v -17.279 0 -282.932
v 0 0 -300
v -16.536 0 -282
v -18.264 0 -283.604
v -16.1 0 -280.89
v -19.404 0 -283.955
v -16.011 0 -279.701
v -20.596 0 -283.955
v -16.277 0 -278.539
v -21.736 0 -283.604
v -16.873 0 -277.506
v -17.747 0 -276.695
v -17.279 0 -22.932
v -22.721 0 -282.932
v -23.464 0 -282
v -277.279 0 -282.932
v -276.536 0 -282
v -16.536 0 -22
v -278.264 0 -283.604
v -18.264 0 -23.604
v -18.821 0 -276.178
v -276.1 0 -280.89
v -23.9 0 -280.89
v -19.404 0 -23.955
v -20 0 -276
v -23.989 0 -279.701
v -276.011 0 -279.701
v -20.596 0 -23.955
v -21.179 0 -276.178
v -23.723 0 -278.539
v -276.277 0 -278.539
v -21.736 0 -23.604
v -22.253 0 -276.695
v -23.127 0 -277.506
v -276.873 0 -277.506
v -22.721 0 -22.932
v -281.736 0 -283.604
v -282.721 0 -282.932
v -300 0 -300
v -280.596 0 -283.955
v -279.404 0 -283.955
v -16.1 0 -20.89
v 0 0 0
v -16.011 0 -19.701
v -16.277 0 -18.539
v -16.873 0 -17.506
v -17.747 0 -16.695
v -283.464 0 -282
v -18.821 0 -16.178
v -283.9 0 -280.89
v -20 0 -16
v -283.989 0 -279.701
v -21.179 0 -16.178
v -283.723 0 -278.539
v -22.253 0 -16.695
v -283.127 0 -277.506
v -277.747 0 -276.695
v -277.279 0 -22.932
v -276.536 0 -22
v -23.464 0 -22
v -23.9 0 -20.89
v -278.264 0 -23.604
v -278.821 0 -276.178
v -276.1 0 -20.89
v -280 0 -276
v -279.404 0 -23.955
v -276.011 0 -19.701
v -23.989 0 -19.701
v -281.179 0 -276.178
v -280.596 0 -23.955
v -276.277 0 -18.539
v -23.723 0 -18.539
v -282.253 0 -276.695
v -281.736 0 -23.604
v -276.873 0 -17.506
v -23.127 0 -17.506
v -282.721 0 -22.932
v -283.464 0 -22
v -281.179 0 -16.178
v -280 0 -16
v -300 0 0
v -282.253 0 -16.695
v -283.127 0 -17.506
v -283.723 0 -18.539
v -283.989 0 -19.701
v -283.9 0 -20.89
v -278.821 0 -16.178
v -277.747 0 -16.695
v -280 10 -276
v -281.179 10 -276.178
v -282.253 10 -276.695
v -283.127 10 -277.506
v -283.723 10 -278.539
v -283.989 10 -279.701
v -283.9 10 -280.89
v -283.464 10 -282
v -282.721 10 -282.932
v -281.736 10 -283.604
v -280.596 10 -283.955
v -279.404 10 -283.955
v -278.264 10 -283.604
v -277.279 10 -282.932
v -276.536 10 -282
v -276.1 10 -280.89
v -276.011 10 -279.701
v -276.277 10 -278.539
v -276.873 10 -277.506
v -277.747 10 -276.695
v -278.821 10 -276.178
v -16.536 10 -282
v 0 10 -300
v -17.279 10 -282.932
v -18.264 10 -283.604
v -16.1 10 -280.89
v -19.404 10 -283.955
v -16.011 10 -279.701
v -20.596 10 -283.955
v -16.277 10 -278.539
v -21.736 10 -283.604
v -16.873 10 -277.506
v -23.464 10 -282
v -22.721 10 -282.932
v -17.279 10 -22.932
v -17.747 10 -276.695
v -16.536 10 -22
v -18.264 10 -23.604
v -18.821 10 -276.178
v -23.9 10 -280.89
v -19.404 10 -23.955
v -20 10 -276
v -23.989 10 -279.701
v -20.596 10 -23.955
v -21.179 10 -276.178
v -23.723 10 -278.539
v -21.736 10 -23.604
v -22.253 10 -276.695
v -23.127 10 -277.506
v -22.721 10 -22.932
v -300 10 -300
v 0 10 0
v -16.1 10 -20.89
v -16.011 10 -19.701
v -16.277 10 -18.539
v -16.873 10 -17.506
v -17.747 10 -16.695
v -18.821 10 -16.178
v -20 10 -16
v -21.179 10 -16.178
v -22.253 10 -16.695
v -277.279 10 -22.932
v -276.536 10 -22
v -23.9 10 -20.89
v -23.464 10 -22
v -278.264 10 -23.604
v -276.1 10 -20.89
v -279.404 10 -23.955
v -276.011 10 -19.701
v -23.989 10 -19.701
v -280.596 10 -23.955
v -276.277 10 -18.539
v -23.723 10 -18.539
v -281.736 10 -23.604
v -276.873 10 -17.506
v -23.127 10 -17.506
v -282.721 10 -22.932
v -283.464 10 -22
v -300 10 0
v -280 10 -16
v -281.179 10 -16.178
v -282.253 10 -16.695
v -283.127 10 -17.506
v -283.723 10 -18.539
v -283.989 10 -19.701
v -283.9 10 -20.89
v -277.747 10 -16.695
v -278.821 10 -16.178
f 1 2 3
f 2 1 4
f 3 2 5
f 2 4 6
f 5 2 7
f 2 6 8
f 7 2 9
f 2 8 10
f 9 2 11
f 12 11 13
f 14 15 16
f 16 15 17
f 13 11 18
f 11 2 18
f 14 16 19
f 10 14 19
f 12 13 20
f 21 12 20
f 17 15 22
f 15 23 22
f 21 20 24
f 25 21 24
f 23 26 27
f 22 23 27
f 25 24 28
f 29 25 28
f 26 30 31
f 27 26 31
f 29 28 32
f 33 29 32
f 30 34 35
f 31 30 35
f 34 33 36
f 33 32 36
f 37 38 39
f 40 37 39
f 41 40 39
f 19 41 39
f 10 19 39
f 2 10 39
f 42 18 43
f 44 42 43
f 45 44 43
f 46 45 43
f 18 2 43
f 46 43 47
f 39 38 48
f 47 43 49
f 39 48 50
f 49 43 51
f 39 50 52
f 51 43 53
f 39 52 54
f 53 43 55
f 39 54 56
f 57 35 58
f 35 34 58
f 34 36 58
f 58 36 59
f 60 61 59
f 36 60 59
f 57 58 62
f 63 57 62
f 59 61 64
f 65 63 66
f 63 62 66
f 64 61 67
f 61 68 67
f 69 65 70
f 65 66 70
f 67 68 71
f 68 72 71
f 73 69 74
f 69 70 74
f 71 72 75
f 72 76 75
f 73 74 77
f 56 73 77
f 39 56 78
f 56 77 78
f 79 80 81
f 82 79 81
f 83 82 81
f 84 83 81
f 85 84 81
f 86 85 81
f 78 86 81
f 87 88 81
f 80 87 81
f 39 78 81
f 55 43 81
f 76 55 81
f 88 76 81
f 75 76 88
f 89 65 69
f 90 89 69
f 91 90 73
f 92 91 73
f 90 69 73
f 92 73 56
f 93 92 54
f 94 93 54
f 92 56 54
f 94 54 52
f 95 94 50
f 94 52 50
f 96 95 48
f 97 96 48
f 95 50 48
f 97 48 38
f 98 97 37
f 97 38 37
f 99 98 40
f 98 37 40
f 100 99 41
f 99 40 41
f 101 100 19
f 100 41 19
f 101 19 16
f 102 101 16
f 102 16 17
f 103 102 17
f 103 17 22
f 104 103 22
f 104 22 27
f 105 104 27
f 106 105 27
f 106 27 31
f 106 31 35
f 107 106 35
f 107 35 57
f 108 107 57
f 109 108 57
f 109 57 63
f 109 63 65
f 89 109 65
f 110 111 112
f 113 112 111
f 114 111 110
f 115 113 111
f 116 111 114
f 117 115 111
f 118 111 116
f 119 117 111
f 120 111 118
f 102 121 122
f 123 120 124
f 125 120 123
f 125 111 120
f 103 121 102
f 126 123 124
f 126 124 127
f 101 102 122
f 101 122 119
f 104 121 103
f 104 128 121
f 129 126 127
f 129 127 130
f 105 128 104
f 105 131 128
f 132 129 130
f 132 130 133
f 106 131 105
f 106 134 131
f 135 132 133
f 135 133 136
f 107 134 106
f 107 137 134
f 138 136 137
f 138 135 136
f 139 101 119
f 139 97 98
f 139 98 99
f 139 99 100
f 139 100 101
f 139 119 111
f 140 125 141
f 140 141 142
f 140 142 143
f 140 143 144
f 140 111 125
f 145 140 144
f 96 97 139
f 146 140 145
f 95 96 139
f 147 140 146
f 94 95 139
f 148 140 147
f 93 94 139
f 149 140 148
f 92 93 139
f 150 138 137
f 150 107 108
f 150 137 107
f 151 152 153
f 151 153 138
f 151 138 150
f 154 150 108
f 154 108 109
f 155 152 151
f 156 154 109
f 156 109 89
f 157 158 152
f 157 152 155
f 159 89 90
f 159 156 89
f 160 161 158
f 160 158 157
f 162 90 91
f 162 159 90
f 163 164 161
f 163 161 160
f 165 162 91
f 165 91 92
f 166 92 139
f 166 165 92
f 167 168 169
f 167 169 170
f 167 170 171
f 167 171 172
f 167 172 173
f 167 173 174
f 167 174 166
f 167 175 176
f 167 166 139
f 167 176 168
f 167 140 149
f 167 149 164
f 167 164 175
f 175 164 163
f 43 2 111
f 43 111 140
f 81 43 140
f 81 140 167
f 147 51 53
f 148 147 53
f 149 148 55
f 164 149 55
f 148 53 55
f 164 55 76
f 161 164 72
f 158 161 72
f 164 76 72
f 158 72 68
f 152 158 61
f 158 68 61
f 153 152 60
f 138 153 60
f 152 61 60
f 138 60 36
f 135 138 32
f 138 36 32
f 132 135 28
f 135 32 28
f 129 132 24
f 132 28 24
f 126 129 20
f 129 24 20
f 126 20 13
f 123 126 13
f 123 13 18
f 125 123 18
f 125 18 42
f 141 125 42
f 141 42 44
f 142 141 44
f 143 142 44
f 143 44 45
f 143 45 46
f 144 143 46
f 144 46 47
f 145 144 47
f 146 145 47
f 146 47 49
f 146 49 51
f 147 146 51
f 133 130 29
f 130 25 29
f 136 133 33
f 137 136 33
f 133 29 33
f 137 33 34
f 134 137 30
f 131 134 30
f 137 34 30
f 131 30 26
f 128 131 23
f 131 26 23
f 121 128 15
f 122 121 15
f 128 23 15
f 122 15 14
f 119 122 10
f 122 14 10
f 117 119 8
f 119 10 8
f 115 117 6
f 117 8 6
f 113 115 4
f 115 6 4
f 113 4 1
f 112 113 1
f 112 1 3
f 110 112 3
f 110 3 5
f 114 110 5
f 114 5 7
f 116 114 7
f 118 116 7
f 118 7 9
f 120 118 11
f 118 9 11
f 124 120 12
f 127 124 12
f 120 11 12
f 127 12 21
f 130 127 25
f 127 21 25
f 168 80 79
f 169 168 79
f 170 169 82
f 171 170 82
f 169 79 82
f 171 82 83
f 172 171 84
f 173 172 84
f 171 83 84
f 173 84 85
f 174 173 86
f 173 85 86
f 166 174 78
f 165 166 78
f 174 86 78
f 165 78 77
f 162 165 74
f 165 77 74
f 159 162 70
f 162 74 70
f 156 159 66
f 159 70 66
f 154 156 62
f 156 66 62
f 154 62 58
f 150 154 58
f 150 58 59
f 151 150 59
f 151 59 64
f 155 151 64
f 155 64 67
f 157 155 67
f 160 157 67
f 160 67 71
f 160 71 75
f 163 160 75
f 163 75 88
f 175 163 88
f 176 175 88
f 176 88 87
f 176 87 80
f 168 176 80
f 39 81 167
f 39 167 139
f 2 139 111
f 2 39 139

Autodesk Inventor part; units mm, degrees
ref_plane "YZ Plane" through (0, 0, 0) normal (1, 0, 0) x (0, 1, 0)
ref_plane "XZ Plane" through (0, 0, 0) normal (0, 1, 0) x (-1, 0, 0)
ref_plane "XY Plane" through (0, 0, 0) normal (0, 0, 1) x (1, 0, 0)
sketch "Sketch1" plane through (0, 0, 0) normal (0, 1, 0) x (-1, 0, 0)
  line L0 (0, 0) -> (300, 0)
  line L1 (300, 0) -> (300, -300)
  line L2 (300, -300) -> (0, -300)
  line L3 (0, -300) -> (0, 0)
  dimension "d0" = 300
  dimension "d1" = 300
extrude "Extrusion1" add sketch "Sketch1" along normal blind 10
sketch "Sketch2" plane through (0, 10, 0) normal (0, 1, 0) x (1, 0, 0)
  line L0 (-300, 0) -> (0, 0) projected
  line L1 (0, 0) -> (0, 300) projected
  point P0 (-20, 20)
  point P1 (-20, 280)
  point P2 (-280, 20)
  point P3 (-280, 280)
  dimension "d4" = 20
  dimension "d5" = 20
  dimension "d8" = 260
  dimension "d11" = 260
hole "Hole1" at (-20, 10, -20) at (-20, 10, -280) at (-280, 10, -20) at (-280, 10, -280) direction (0, -1, 0) diameter 8 end through all
properties part number "Plate"
